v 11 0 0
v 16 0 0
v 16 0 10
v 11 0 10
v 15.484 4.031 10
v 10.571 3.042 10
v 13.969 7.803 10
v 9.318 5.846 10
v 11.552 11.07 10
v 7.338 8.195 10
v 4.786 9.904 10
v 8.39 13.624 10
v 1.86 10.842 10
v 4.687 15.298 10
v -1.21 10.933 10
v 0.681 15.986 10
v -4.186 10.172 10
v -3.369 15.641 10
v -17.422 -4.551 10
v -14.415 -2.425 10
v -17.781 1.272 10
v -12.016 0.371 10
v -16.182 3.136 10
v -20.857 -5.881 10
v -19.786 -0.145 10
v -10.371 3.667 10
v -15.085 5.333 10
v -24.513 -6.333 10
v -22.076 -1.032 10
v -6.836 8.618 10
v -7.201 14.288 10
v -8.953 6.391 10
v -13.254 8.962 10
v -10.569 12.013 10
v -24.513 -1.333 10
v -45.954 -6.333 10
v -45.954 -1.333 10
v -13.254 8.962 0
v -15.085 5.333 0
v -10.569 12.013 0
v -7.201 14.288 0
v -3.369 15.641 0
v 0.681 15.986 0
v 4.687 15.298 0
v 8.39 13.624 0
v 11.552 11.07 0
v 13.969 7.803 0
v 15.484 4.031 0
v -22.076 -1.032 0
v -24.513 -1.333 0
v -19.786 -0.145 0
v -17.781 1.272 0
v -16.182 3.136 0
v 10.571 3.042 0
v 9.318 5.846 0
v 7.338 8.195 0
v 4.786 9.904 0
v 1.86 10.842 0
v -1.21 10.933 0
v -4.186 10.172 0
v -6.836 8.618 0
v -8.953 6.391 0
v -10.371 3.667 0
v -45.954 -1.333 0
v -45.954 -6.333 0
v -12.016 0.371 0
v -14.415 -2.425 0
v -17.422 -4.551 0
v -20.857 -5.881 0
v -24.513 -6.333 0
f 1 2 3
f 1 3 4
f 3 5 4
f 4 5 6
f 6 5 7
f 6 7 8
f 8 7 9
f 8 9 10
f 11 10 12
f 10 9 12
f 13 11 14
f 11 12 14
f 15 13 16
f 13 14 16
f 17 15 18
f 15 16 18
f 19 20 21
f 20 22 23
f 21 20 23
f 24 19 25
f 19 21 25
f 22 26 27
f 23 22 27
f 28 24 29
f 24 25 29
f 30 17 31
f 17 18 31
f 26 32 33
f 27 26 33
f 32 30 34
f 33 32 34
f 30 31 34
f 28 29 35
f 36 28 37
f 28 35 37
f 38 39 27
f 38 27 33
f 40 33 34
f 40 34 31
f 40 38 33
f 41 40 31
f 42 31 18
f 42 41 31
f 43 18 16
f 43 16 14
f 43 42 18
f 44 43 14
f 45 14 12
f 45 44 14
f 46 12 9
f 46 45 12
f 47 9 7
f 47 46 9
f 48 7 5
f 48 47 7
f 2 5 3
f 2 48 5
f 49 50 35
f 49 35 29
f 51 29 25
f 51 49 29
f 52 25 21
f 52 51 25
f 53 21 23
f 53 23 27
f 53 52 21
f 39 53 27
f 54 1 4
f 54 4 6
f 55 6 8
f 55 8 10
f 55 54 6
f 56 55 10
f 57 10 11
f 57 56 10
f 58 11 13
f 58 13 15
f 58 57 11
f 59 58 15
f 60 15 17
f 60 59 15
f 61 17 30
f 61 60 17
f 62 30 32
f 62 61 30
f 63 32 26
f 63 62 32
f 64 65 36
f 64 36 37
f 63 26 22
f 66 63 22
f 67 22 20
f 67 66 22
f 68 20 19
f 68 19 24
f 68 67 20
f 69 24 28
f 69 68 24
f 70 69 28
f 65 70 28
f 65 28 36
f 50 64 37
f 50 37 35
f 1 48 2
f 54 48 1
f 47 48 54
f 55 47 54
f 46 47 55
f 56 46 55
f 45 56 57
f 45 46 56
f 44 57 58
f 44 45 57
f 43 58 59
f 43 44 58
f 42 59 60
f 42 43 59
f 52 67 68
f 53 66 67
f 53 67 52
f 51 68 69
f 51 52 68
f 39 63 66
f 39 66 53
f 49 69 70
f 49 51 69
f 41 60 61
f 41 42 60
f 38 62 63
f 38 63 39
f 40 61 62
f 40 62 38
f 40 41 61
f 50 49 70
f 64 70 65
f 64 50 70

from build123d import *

# Parameters (mm, degrees)
BASE_EXTRUDE_DEPTH = 10


with BuildPart() as part:
    # Sketch1 → Base-Extrude (new body)
    with BuildSketch(Plane.XY):
        with BuildLine():
            Line((-24.513035081, -6.333333333), (-45.95357014, -6.333333333))
            Line((-45.95357014, -6.333333333), (-45.95357014, -1.333333333))
            Line((-45.95357014, -1.333333333), (-24.513035081, -1.333333333))
            ThreePointArc((-24.513035081, -1.333333333), (-18.739532389, 0.501700857), (-15.084944665, 5.333333333))
            ThreePointArc((-15.084944665, 5.333333333), (2.70563166, 15.769576954), (16, 0))
            Line((16, 0), (11, 0))
            ThreePointArc((11, 0), (1.860121766, 10.841584156), (-10.370899457, 3.666666667))
            ThreePointArc((-10.370899457, 3.666666667), (-15.852781043, -3.580782047), (-24.513035081, -6.333333333))
        make_face()
    extrude(amount=BASE_EXTRUDE_DEPTH)


solid = part.part
